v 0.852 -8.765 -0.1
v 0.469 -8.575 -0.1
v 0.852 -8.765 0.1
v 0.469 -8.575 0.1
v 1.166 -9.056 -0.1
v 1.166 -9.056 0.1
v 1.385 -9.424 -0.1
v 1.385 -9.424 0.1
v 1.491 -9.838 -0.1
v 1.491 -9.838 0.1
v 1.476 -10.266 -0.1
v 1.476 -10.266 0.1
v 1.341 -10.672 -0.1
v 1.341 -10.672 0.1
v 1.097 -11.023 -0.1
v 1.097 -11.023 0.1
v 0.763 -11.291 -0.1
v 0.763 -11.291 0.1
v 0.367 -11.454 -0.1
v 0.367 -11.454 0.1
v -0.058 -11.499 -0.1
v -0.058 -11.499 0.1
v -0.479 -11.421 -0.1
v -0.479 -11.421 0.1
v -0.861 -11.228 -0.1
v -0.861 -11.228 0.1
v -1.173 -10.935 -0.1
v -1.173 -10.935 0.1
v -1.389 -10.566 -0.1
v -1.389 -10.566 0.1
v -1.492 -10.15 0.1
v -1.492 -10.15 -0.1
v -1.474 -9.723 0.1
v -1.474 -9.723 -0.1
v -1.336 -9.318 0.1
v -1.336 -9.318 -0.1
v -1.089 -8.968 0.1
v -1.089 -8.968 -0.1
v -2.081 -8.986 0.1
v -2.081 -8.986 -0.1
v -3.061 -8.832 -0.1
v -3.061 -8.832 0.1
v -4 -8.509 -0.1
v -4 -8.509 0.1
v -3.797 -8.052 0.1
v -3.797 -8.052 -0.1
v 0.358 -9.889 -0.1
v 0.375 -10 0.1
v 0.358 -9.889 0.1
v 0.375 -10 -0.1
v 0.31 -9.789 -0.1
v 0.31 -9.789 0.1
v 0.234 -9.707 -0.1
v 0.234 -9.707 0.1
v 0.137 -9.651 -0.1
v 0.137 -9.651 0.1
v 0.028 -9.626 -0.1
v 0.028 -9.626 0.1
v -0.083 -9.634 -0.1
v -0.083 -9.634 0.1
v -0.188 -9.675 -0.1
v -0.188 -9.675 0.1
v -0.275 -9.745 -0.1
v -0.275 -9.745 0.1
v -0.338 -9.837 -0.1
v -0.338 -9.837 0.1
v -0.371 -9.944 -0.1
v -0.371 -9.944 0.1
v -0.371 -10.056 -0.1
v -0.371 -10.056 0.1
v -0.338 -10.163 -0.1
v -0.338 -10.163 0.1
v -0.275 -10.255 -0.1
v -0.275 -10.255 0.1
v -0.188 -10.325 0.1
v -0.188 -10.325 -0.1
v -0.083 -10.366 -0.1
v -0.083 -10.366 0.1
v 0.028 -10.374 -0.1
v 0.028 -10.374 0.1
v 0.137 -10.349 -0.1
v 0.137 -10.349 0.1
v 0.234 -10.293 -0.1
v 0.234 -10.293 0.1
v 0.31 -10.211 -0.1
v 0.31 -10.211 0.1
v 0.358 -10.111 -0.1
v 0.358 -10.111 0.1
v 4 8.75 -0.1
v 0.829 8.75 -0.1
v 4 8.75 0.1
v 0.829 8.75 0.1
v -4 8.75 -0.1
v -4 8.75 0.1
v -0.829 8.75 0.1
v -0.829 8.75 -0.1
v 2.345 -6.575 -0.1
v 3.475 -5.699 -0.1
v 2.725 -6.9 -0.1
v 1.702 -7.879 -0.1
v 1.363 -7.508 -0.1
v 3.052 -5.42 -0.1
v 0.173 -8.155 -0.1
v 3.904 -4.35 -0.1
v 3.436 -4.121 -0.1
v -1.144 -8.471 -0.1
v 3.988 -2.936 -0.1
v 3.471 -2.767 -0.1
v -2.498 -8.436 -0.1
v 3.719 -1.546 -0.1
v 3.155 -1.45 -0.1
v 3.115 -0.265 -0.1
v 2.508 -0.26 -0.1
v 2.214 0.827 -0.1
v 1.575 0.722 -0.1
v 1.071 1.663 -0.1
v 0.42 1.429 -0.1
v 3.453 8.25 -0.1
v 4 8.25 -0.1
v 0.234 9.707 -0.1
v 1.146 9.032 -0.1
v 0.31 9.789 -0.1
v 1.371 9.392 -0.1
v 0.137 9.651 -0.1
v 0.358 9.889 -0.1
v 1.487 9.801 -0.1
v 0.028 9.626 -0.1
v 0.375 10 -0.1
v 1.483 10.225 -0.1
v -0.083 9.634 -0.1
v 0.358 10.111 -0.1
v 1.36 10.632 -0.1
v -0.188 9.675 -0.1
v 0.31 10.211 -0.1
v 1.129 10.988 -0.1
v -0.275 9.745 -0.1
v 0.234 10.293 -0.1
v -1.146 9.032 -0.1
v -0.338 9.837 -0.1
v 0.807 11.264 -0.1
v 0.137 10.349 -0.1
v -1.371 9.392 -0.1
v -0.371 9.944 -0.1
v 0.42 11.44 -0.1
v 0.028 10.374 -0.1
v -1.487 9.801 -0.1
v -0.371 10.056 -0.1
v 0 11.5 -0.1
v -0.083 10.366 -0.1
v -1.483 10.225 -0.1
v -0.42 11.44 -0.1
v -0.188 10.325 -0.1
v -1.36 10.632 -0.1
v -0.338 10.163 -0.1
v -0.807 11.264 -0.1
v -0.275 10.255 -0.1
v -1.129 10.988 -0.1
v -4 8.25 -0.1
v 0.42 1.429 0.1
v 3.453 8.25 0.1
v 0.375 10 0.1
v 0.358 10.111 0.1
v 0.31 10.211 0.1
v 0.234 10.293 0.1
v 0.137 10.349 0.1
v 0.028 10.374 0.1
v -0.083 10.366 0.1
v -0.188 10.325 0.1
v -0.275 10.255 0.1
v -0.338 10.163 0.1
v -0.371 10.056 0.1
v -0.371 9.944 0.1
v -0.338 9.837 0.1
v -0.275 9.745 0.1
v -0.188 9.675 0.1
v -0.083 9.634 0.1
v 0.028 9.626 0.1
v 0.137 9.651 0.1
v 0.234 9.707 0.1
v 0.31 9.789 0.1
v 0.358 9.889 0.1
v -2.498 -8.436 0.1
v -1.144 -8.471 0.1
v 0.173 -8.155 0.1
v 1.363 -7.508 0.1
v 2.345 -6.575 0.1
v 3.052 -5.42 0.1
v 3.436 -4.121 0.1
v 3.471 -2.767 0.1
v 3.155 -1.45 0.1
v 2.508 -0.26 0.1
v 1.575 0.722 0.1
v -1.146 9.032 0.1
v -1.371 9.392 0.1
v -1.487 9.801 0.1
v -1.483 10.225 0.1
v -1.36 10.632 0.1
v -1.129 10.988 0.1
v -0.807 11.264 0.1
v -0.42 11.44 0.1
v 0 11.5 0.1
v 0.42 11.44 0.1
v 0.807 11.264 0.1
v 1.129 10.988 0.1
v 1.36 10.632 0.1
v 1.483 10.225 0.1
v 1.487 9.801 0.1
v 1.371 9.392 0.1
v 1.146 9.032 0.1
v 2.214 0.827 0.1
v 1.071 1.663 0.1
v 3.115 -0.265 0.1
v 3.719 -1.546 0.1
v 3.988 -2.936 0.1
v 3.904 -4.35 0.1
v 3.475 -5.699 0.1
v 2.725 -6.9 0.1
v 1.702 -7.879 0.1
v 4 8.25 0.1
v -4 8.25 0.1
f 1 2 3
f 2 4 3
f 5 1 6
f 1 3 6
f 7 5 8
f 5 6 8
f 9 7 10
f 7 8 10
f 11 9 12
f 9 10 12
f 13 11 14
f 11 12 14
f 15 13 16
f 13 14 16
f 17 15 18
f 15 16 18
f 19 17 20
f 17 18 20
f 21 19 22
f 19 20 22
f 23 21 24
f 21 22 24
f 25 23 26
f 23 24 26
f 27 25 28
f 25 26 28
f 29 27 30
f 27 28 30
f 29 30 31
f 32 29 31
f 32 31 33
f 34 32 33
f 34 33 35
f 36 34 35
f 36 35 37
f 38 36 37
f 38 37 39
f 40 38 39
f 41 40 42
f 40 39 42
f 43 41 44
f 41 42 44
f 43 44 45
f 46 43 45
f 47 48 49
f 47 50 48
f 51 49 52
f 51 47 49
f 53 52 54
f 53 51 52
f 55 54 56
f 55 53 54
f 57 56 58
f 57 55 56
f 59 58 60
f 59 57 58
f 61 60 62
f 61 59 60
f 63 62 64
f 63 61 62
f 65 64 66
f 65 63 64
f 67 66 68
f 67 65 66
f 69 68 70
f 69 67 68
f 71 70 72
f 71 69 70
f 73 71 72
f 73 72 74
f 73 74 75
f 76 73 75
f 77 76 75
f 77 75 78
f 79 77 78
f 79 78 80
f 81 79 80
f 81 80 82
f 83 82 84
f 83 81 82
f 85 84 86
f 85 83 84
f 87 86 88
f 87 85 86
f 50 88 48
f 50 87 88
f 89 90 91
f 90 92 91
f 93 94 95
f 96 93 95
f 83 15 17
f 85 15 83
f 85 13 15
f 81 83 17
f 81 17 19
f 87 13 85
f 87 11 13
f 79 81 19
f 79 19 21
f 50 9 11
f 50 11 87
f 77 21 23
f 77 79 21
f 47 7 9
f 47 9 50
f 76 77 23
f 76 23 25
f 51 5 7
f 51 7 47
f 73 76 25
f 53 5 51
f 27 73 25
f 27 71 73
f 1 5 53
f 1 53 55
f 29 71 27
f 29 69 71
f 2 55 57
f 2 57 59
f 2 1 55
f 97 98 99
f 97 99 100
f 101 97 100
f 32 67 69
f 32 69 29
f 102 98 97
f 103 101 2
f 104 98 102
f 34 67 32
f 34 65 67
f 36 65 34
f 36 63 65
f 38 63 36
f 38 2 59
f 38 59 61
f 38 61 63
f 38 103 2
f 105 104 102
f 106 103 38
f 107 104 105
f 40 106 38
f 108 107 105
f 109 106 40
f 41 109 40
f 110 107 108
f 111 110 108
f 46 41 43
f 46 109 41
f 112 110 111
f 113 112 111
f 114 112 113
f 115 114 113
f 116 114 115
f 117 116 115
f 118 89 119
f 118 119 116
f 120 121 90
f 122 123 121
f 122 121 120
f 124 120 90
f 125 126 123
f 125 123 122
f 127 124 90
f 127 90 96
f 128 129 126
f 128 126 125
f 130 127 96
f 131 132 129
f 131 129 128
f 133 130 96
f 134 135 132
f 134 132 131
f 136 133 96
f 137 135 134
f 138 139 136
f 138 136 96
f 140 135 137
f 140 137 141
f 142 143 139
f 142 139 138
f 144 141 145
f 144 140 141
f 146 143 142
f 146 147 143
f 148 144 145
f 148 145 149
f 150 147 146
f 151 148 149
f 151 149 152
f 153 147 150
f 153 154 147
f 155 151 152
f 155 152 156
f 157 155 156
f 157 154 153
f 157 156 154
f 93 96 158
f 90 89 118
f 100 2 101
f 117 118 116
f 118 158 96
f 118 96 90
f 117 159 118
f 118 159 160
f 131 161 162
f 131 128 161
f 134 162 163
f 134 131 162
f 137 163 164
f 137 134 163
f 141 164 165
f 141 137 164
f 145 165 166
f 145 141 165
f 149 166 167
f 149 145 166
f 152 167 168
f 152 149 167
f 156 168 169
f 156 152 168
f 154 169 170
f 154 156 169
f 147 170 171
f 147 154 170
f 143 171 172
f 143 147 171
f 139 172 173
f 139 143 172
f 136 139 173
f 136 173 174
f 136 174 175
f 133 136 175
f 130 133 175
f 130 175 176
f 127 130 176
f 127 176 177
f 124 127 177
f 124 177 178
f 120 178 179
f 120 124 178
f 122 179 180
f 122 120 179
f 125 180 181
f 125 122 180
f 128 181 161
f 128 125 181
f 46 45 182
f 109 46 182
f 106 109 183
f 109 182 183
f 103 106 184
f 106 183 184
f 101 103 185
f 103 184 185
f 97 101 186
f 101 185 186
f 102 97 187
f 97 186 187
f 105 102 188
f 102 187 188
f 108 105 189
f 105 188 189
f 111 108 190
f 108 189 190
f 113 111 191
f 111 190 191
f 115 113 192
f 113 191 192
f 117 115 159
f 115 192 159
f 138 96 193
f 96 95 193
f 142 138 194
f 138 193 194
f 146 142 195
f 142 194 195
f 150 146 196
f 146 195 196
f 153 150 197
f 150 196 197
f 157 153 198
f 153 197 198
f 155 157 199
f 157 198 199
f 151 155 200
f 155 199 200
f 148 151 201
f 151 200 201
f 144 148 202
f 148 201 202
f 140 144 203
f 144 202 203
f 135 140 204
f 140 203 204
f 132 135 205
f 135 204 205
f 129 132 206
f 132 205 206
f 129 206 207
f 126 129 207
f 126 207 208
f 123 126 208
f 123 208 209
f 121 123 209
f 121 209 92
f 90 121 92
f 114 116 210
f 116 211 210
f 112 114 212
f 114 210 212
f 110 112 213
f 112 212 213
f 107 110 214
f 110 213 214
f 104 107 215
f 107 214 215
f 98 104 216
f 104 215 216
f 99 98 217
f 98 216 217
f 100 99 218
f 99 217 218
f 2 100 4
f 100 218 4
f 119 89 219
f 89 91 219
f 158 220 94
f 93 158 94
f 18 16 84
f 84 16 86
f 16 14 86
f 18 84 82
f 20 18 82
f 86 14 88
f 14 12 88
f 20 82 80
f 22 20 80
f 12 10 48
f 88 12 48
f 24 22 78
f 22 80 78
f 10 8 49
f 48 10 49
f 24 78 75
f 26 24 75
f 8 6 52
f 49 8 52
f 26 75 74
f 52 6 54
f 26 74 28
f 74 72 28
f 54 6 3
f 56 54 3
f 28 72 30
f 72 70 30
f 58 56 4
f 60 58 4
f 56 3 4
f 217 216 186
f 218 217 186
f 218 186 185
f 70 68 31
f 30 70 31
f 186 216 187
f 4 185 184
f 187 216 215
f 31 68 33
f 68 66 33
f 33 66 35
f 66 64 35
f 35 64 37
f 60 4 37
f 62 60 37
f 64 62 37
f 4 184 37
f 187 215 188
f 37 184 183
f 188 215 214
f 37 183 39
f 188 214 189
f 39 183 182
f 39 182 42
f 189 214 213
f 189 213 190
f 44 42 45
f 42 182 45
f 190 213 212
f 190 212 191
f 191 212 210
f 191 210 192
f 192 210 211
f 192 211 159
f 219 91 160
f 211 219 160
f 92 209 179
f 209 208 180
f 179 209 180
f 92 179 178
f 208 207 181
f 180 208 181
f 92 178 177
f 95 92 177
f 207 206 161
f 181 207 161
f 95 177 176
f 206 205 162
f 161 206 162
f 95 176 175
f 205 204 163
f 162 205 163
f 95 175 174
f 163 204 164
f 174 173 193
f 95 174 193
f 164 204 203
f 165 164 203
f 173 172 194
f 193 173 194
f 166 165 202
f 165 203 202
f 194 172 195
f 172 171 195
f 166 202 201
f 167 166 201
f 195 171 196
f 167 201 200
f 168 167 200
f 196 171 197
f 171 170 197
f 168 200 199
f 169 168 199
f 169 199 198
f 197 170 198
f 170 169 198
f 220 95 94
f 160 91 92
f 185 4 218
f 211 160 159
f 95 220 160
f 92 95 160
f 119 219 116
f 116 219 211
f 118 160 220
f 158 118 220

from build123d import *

# Parameters (mm, degrees)
SKETCH1_R           = 0.375
BOSS_EXTRUDE1_DEPTH = 0.1


with BuildPart() as part:
    # Sketch1 → Boss-Extrude1 (new body, symmetric)
    with BuildSketch(Plane.XY):
        with BuildLine():
            Line((-4, 8.75), (-0.829156198, 8.75))
            ThreePointArc((-0.829156198, 8.75), (0, 11.5), (0.829156198, 8.75))
            Line((0.829156198, 8.75), (4, 8.75))
            Line((4, 8.75), (4, 8.25))
            Line((4, 8.25), (1.070800598, 1.663056339))
            ThreePointArc((1.070800598, 1.663056339), (3.990187346, -3.645423064), (0.468669321, -8.575096822))
            ThreePointArc((0.468669321, -8.575096822), (0.367162541, -11.454369853), (-1.088850392, -8.968300032))
            ThreePointArc((-1.088850392, -8.968300032), (-2.57467118, -8.930560768), (-4, -8.509223116))
            Line((-4, -8.509223116), (-3.796834113, -8.052360311))
            ThreePointArc((-3.796834113, -8.052360311), (3.052360311, -5.419717925), (0.419717925, 1.429476498))
            Line((0.419717925, 1.429476498), (3.452789771, 8.25))
            Line((3.452789771, 8.25), (-4, 8.25))
            Line((-4, 8.25), (-4, 8.75))
        make_face()
        with Locations((0, 10)):
            Circle(SKETCH1_R, mode=Mode.SUBTRACT)
        with Locations((0, -10)):
            Circle(SKETCH1_R, mode=Mode.SUBTRACT)
    extrude(amount=BOSS_EXTRUDE1_DEPTH, both=True)


solid = part.part
